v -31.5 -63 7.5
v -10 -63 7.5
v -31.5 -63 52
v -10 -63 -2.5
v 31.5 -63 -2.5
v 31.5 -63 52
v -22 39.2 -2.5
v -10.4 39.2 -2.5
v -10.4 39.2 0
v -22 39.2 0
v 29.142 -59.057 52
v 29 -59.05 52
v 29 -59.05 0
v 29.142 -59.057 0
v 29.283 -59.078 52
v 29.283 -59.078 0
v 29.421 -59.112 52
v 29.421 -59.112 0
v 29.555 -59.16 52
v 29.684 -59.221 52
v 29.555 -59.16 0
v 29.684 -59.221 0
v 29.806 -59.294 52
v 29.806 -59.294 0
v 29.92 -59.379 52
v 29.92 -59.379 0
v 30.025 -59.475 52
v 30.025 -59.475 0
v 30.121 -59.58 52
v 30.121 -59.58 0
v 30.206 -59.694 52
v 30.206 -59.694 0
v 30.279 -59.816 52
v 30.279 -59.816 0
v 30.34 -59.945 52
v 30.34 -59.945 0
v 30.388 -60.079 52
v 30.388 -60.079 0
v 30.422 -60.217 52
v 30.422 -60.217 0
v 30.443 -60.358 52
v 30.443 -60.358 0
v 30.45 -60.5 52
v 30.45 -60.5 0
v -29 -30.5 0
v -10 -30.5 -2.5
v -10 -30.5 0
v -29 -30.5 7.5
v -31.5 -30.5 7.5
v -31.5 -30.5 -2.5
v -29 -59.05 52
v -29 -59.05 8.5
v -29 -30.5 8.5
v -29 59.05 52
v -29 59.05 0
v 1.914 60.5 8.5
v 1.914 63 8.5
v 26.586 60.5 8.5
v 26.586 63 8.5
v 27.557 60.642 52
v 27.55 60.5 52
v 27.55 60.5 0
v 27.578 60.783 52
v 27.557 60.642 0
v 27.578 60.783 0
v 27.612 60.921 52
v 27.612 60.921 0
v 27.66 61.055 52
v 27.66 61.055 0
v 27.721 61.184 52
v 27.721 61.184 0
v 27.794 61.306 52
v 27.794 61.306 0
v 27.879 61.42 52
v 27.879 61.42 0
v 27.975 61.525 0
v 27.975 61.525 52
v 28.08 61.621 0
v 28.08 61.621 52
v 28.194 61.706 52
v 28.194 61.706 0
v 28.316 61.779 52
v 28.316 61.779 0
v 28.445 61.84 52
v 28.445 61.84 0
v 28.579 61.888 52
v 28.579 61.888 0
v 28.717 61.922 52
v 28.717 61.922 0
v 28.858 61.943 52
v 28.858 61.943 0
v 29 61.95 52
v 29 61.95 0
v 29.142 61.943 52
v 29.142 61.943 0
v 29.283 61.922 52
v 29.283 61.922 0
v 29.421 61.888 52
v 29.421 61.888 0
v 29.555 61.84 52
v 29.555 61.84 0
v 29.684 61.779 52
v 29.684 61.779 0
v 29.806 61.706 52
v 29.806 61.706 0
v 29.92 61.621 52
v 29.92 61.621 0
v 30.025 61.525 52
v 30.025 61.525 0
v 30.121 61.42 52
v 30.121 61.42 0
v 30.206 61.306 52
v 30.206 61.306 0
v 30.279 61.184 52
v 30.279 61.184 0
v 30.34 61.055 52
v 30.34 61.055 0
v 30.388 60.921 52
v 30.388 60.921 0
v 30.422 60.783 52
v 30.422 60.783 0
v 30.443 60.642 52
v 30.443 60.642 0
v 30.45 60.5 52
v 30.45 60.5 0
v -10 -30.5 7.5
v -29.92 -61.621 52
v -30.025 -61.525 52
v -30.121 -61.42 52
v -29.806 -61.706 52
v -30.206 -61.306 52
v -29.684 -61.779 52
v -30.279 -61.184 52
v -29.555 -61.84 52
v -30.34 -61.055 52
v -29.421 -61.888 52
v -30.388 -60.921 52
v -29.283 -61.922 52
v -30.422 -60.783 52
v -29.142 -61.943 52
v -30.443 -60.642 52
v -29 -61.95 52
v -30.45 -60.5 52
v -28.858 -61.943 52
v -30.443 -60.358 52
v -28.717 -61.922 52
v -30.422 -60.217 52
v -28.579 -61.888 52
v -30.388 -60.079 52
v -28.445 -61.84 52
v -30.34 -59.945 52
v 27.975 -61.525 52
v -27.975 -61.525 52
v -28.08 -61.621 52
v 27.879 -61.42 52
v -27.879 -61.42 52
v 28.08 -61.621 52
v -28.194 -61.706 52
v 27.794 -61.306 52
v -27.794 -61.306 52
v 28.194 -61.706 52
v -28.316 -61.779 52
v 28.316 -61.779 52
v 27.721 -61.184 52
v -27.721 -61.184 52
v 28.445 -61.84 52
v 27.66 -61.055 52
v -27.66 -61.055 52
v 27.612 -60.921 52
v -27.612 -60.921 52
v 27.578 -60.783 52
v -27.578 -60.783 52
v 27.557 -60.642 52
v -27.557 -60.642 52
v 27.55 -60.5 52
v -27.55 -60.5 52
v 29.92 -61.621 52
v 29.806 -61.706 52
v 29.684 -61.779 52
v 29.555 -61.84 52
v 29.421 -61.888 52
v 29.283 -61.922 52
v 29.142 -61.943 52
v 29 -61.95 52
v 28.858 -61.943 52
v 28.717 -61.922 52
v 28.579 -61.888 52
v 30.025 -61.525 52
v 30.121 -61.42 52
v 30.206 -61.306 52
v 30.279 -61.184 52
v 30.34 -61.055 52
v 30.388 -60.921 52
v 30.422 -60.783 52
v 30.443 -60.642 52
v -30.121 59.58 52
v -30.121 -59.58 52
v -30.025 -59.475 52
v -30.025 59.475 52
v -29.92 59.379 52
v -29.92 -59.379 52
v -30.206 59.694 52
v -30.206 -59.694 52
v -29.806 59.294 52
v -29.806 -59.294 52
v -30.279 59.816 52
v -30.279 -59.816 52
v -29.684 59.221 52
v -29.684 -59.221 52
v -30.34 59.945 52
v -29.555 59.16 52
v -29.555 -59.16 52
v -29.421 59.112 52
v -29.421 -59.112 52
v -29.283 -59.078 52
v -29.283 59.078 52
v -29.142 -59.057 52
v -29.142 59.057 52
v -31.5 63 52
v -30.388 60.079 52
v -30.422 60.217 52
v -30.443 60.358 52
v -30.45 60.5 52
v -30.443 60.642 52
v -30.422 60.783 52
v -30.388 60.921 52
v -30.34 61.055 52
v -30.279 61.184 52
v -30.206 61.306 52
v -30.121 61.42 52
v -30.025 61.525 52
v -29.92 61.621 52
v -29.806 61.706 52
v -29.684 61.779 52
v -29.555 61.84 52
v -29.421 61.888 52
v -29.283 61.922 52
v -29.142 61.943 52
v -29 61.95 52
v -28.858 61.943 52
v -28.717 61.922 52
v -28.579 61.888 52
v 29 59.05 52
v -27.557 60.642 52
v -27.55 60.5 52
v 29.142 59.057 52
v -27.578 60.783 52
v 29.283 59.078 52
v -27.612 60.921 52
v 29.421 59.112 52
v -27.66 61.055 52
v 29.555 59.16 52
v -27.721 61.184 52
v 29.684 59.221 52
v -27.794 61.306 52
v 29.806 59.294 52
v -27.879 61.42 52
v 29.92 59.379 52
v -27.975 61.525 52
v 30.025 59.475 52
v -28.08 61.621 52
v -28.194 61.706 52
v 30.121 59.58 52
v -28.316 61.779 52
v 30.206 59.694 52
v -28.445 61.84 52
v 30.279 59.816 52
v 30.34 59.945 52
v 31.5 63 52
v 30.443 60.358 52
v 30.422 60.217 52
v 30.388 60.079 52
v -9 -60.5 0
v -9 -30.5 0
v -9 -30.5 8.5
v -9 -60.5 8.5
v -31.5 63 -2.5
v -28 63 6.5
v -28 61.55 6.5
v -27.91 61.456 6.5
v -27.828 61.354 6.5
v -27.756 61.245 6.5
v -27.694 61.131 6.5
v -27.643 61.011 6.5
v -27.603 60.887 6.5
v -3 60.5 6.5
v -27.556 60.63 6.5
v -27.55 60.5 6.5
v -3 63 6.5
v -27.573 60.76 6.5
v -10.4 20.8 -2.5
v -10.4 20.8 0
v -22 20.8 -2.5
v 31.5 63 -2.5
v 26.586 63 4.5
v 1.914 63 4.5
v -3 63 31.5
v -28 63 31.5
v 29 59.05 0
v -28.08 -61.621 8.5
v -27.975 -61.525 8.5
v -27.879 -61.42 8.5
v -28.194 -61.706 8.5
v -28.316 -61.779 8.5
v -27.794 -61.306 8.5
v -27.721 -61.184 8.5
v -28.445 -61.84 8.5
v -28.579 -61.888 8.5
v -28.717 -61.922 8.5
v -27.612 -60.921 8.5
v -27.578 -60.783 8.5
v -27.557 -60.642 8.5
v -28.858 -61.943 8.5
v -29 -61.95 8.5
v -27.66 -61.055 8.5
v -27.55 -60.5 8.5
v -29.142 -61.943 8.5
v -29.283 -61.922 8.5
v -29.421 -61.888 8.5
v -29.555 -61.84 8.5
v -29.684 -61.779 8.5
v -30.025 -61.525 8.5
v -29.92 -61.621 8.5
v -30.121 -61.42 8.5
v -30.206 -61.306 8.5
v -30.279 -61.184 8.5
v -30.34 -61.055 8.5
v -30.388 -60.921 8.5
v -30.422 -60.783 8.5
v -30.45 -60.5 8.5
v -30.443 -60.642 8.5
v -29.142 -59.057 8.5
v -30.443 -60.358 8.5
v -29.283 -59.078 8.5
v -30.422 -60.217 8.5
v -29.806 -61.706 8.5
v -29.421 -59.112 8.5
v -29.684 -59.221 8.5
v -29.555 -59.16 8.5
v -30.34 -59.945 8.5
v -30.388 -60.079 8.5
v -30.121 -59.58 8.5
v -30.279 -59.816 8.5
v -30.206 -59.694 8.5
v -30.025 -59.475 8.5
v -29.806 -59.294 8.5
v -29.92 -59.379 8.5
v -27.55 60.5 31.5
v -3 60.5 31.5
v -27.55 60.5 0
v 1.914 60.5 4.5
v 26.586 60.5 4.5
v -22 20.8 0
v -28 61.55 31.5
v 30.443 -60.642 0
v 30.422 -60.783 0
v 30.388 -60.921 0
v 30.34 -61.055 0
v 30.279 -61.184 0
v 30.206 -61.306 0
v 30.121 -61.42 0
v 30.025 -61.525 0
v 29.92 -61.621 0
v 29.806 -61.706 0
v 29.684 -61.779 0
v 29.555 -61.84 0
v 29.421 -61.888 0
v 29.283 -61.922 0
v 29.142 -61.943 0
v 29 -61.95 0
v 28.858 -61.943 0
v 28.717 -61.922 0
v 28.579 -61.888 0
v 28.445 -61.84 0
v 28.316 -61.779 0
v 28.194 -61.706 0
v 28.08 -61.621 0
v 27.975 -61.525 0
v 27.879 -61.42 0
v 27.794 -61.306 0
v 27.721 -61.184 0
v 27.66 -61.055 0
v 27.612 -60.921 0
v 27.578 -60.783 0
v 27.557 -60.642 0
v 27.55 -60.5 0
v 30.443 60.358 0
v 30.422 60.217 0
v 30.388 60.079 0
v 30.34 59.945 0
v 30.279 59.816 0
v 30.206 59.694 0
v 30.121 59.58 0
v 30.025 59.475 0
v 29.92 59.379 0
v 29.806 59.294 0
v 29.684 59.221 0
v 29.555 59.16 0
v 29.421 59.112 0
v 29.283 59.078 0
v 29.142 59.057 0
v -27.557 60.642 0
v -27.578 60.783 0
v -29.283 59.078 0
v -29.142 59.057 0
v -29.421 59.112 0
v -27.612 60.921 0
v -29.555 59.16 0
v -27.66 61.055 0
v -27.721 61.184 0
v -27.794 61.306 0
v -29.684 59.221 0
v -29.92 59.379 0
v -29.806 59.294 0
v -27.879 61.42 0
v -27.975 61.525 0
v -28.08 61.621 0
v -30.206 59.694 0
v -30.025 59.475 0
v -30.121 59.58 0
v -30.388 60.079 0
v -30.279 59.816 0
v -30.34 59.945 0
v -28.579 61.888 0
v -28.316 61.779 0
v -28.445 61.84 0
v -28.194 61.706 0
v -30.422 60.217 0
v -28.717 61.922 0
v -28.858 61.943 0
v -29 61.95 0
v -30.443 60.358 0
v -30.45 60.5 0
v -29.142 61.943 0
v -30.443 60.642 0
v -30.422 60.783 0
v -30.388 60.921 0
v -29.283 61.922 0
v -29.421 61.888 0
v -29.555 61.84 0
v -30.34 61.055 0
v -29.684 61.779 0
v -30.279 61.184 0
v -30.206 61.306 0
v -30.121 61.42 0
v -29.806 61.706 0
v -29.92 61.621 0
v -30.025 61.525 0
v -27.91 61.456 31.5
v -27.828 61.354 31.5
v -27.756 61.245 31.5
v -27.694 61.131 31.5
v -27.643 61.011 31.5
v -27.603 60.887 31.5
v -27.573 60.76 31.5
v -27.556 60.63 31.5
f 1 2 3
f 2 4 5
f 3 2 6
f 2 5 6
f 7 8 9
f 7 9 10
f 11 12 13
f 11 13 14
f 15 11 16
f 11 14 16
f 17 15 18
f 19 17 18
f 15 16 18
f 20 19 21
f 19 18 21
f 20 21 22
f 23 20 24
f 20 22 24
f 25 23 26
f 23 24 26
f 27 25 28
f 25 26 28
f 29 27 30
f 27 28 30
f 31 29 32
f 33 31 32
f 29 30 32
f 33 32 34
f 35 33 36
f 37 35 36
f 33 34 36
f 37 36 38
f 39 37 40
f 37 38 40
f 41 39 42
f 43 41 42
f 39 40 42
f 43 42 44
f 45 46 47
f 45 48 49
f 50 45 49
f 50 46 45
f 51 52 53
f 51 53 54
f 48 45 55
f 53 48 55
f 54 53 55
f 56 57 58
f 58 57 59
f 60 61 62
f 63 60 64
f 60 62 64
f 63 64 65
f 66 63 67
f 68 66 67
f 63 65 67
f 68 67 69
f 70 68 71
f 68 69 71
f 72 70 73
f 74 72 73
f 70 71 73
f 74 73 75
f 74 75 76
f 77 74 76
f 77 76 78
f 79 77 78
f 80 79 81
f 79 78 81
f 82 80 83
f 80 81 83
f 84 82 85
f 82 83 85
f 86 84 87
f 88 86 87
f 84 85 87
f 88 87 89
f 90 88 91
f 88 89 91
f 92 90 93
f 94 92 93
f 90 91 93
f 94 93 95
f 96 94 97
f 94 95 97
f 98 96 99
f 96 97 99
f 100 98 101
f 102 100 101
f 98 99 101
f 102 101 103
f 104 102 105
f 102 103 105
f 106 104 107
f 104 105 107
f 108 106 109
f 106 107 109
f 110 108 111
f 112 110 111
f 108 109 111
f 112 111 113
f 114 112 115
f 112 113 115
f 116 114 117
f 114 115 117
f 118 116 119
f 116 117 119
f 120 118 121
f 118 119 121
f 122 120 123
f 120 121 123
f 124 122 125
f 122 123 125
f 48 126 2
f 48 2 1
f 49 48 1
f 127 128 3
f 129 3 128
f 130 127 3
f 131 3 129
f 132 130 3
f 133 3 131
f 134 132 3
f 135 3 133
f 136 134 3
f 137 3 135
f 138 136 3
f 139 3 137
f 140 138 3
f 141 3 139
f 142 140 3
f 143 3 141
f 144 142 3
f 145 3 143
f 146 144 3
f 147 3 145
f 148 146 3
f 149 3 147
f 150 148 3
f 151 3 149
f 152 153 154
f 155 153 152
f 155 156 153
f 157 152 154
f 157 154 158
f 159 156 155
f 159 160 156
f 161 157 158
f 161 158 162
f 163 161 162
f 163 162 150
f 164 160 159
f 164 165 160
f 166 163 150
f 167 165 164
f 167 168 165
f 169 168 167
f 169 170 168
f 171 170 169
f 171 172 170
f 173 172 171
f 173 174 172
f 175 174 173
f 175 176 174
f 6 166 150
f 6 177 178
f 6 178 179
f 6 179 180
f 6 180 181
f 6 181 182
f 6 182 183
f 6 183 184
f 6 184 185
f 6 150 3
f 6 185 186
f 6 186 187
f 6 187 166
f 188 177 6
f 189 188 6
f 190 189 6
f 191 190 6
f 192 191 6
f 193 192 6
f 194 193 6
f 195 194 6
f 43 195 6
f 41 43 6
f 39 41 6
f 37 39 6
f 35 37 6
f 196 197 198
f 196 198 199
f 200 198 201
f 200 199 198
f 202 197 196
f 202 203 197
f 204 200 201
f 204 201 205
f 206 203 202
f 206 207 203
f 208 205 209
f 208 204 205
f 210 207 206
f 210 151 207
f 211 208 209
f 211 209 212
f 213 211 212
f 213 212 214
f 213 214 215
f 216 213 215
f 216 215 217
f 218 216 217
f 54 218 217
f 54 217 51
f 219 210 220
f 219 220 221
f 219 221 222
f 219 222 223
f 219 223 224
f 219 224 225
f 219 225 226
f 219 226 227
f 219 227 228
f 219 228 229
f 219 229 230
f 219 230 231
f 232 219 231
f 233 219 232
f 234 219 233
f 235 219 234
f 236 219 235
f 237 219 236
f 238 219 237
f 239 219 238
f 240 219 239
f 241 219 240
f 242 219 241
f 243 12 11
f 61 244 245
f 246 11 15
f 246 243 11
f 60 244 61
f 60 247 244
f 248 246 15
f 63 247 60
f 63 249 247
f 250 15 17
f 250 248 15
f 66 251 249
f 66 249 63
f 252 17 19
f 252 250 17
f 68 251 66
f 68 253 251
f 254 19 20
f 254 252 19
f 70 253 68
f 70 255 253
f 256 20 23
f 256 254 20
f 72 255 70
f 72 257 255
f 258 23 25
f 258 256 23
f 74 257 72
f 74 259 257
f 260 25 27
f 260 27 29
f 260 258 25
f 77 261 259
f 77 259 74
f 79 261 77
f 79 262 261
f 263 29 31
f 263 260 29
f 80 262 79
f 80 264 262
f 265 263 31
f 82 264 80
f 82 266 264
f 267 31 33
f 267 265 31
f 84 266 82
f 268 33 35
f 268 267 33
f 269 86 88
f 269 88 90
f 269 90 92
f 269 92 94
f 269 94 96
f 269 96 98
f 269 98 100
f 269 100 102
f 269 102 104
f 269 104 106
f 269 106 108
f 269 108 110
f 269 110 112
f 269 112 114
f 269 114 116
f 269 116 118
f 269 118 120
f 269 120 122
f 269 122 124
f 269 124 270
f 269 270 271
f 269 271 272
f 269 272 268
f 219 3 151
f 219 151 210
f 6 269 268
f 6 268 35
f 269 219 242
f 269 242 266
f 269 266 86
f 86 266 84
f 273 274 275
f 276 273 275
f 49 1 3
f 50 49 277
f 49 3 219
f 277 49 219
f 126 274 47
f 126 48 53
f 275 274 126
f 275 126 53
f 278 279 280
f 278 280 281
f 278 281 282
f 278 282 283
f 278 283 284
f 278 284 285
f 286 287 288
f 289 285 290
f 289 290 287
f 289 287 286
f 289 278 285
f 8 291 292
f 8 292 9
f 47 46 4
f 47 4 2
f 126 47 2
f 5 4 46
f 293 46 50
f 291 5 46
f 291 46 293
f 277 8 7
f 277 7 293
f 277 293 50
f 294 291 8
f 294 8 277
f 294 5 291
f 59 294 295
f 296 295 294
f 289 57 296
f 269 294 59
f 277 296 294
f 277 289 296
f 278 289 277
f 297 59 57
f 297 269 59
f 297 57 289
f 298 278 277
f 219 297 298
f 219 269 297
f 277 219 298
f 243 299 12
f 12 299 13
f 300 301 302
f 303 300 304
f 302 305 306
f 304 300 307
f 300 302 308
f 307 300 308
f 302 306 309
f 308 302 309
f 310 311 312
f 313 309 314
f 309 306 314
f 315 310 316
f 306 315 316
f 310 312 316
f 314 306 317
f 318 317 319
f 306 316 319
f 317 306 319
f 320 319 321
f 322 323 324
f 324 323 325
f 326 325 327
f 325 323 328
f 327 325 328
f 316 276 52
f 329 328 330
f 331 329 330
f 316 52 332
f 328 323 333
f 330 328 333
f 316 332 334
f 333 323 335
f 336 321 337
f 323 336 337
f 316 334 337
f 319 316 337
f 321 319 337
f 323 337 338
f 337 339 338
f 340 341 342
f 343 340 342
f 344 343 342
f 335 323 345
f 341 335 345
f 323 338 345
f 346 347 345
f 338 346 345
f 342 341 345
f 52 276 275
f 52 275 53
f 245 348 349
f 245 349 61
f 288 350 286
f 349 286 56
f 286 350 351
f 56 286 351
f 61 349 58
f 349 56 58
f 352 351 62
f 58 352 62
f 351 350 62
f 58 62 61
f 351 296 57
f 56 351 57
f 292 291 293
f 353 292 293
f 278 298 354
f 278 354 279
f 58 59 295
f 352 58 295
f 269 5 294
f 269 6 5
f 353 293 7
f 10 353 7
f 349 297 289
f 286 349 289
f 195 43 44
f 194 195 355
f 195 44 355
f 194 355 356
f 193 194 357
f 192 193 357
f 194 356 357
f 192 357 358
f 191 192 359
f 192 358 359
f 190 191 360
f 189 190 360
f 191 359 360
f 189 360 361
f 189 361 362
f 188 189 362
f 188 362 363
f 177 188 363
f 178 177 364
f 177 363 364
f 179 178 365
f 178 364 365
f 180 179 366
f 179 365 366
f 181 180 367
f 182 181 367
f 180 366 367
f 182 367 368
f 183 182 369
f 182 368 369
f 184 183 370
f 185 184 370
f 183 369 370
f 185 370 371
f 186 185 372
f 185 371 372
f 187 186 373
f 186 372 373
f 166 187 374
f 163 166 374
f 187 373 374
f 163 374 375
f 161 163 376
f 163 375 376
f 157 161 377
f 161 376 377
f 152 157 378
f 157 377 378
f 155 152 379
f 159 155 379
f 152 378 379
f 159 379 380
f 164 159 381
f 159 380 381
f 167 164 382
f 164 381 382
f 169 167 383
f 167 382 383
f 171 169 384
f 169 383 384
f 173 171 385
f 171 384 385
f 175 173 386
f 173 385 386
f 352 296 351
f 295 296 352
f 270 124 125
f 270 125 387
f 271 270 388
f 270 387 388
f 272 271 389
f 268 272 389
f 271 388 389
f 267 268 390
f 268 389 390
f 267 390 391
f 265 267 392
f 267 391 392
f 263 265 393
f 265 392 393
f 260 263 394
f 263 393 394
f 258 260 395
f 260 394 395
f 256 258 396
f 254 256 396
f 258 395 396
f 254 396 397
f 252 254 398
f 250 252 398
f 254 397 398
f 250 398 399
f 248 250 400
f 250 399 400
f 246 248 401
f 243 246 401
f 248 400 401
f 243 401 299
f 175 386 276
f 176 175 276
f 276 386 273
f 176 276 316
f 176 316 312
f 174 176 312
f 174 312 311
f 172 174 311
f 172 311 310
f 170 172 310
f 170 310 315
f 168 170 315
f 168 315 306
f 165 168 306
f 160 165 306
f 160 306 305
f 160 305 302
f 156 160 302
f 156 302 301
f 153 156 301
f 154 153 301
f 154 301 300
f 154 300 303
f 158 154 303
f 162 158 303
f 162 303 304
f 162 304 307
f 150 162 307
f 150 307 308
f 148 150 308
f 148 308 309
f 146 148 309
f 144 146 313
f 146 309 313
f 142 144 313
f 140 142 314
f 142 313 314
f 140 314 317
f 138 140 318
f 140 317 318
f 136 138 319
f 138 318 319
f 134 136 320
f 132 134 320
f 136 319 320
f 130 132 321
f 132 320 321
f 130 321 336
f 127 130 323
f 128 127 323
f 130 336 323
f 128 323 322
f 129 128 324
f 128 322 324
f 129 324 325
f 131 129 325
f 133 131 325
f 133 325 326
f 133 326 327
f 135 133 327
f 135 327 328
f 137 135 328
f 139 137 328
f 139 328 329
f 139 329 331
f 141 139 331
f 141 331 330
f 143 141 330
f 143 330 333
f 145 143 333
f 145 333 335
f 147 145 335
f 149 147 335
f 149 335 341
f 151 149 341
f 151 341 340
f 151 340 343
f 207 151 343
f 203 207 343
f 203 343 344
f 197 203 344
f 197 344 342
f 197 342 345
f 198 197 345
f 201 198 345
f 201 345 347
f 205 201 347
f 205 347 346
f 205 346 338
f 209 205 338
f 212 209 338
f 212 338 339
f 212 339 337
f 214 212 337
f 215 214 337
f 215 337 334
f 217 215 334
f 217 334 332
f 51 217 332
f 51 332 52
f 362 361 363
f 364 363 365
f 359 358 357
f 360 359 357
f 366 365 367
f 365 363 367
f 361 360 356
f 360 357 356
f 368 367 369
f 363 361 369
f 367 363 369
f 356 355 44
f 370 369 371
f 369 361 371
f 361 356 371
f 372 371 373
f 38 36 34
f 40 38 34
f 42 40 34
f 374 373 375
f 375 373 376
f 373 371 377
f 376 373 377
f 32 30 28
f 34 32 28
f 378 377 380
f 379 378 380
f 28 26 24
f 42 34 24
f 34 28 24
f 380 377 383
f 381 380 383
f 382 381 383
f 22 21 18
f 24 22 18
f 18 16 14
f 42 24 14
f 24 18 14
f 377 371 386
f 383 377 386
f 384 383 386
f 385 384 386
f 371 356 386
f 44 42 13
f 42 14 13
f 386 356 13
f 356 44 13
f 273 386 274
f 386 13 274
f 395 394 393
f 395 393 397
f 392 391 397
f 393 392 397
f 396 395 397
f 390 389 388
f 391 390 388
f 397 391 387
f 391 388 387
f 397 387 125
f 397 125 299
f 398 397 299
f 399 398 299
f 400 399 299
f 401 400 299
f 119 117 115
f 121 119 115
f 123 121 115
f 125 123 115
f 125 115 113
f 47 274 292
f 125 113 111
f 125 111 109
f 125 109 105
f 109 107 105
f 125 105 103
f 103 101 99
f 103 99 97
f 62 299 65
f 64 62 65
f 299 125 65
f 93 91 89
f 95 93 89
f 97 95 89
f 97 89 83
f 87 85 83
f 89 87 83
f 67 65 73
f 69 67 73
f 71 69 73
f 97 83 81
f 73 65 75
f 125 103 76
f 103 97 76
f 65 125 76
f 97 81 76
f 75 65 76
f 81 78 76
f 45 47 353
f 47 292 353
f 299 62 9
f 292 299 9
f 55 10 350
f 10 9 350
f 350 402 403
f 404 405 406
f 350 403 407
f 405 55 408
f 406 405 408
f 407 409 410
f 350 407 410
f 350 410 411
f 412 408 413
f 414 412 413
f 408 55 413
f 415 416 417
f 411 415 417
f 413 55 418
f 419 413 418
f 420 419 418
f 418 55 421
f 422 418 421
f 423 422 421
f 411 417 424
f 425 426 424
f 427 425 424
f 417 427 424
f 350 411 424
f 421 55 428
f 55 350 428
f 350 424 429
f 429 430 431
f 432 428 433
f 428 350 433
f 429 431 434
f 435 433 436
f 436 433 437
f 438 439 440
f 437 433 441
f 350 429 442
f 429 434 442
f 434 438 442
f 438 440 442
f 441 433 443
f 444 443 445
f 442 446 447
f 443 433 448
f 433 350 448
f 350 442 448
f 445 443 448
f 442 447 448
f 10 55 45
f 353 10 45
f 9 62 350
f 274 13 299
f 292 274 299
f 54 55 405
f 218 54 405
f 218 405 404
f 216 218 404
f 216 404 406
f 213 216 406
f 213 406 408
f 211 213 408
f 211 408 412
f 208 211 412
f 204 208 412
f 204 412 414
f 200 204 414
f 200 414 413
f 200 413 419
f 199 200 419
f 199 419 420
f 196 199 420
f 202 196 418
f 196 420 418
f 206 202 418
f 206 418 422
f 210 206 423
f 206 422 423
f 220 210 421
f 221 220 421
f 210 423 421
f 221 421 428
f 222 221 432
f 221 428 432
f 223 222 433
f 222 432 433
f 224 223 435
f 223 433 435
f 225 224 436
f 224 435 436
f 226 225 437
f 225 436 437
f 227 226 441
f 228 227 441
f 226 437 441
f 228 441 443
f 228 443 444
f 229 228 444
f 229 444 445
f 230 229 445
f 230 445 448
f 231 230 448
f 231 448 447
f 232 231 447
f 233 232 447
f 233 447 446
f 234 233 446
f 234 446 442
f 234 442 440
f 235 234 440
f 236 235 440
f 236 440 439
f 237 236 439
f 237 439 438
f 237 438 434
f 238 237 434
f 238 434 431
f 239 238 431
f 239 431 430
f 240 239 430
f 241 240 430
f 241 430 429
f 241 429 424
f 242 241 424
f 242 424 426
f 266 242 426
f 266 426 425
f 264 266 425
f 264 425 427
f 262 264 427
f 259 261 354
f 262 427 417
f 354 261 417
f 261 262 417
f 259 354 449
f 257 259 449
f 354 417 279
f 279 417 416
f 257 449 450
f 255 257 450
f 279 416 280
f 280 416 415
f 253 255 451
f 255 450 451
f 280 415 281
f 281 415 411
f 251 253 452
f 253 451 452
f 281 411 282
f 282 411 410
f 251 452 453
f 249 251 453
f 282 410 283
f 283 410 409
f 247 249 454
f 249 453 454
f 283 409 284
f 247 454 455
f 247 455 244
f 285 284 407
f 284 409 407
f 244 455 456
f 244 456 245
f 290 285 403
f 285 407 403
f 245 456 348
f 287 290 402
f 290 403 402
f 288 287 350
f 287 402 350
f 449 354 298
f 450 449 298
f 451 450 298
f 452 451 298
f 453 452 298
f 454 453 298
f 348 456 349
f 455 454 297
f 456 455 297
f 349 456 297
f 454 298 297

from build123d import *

# Parameters (mm, degrees)
SKETCH1_W           = 63
SKETCH1_H           = 126
BOSS_EXTRUDE1_DEPTH = 52
SKETCH2_W           = 63
SKETCH2_H           = 126
BOSS_EXTRUDE2_DEPTH = 2.5
SKETCH4_W           = 22.5
SKETCH4_H           = 32.5
CUT_EXTRUDE1_DEPTH  = 10
SKETCH5_W           = 22.5
SKETCH5_H           = 32.5
BOSS_EXTRUDE3_DEPTH = 1
SKETCH7_W           = 10
SKETCH7_H           = 32.5
BOSS_EXTRUDE6_DEPTH = 1
SKETCH8_W           = 11.6
SKETCH8_H           = 18.4
CUT_EXTRUDE2_DEPTH  = 90.058969228
SKETCH9_W           = 25
SKETCH9_H           = 25
CUT_EXTRUDE3_DEPTH  = 11
SKETCH10_W          = 24.67160759
SKETCH10_H          = 2
CUT_EXTRUDE4_DEPTH  = 11


with BuildPart() as part:
    # Sketch1 → Boss-Extrude1 (new body)
    with BuildSketch(Plane.XY):
        Rectangle(SKETCH1_W, SKETCH1_H)
        with BuildLine():
            Line((-27.55, 60.5), (27.55, 60.5))
            ThreePointArc((27.55, 60.5), (29, 61.95), (30.45, 60.5))
            ThreePointArc((30.45, 60.5), (30.025304833, 59.474695167), (29, 59.05))
            Line((29, 59.05), (29, -59.05))
            ThreePointArc((29, -59.05), (30.025304833, -59.474695167), (30.45, -60.5))
            ThreePointArc((30.45, -60.5), (29, -61.95), (27.55, -60.5))
            Line((27.55, -60.5), (-27.55, -60.5))
            ThreePointArc((-27.55, -60.5), (-30.025304833, -61.525304833), (-29, -59.05))
            Line((-29, -59.05), (-29, 59.05))
            ThreePointArc((-29, 59.05), (-30.025304833, 61.525304833), (-27.55, 60.5))
        make_face(mode=Mode.SUBTRACT)
    extrude(amount=BOSS_EXTRUDE1_DEPTH)

    # Sketch2 → Boss-Extrude2 (add)
    with BuildSketch(Plane(origin=(0, 0, 0), x_dir=(-1, 0, 0), z_dir=(0, 0, -1))):
        Rectangle(SKETCH2_W, SKETCH2_H)
    extrude(amount=BOSS_EXTRUDE2_DEPTH)

    # Sketch4 → Cut-Extrude1 (cut)
    with BuildSketch(Plane(origin=(0, 0, -2.5), x_dir=(-1, 0, 0), z_dir=(0, 0, -1))):
        with Locations((20.25, -46.75)):
            Rectangle(SKETCH4_W, SKETCH4_H)
    extrude(amount=-CUT_EXTRUDE1_DEPTH, mode=Mode.SUBTRACT)

    # Sketch5 → Boss-Extrude3 (add)
    with BuildSketch(Plane(origin=(0, 0, 7.5), x_dir=(-1, 0, 0), z_dir=(0, 0, -1))):
        with Locations((20.25, -46.75)):
            Rectangle(SKETCH5_W, SKETCH5_H)
    extrude(amount=-BOSS_EXTRUDE3_DEPTH)

    # Sketch7 → Boss-Extrude6 (add)
    with BuildSketch(Plane.ZY.offset(9)):
        with Locations((2.5, -46.75)):
            Rectangle(SKETCH7_W, SKETCH7_H)
    extrude(amount=BOSS_EXTRUDE6_DEPTH)

    # Sketch8 → Cut-Extrude2 (cut, through all)
    with BuildSketch(Plane(origin=(0, 0, -2.5), x_dir=(-1, 0, 0), z_dir=(0, 0, -1))):
        with Locations((16.2, 30)):
            Rectangle(SKETCH8_W, SKETCH8_H)
    extrude(amount=-CUT_EXTRUDE2_DEPTH, mode=Mode.SUBTRACT)

    # Sketch9 → Cut-Extrude3 (cut)
    with BuildSketch(Plane(origin=(0, 63, 0), x_dir=(1, 0, 0), z_dir=(0, 1, 0))):
        with Locations((-15.5, -19)):
            Rectangle(SKETCH9_W, SKETCH9_H)
    extrude(amount=-CUT_EXTRUDE3_DEPTH, mode=Mode.SUBTRACT)

    # Sketch10 → Cut-Extrude4 (cut)
    with BuildSketch(Plane(origin=(0, 63, 0), x_dir=(1, 0, 0), z_dir=(0, 1, 0))):
        with Locations((14.25, -7.5)):
            Rectangle(SKETCH10_W, SKETCH10_H)
        with Locations((14.25, -5.5)):
            Rectangle(SKETCH10_W, SKETCH10_H)
    extrude(amount=-CUT_EXTRUDE4_DEPTH, mode=Mode.SUBTRACT)


solid = part.part
